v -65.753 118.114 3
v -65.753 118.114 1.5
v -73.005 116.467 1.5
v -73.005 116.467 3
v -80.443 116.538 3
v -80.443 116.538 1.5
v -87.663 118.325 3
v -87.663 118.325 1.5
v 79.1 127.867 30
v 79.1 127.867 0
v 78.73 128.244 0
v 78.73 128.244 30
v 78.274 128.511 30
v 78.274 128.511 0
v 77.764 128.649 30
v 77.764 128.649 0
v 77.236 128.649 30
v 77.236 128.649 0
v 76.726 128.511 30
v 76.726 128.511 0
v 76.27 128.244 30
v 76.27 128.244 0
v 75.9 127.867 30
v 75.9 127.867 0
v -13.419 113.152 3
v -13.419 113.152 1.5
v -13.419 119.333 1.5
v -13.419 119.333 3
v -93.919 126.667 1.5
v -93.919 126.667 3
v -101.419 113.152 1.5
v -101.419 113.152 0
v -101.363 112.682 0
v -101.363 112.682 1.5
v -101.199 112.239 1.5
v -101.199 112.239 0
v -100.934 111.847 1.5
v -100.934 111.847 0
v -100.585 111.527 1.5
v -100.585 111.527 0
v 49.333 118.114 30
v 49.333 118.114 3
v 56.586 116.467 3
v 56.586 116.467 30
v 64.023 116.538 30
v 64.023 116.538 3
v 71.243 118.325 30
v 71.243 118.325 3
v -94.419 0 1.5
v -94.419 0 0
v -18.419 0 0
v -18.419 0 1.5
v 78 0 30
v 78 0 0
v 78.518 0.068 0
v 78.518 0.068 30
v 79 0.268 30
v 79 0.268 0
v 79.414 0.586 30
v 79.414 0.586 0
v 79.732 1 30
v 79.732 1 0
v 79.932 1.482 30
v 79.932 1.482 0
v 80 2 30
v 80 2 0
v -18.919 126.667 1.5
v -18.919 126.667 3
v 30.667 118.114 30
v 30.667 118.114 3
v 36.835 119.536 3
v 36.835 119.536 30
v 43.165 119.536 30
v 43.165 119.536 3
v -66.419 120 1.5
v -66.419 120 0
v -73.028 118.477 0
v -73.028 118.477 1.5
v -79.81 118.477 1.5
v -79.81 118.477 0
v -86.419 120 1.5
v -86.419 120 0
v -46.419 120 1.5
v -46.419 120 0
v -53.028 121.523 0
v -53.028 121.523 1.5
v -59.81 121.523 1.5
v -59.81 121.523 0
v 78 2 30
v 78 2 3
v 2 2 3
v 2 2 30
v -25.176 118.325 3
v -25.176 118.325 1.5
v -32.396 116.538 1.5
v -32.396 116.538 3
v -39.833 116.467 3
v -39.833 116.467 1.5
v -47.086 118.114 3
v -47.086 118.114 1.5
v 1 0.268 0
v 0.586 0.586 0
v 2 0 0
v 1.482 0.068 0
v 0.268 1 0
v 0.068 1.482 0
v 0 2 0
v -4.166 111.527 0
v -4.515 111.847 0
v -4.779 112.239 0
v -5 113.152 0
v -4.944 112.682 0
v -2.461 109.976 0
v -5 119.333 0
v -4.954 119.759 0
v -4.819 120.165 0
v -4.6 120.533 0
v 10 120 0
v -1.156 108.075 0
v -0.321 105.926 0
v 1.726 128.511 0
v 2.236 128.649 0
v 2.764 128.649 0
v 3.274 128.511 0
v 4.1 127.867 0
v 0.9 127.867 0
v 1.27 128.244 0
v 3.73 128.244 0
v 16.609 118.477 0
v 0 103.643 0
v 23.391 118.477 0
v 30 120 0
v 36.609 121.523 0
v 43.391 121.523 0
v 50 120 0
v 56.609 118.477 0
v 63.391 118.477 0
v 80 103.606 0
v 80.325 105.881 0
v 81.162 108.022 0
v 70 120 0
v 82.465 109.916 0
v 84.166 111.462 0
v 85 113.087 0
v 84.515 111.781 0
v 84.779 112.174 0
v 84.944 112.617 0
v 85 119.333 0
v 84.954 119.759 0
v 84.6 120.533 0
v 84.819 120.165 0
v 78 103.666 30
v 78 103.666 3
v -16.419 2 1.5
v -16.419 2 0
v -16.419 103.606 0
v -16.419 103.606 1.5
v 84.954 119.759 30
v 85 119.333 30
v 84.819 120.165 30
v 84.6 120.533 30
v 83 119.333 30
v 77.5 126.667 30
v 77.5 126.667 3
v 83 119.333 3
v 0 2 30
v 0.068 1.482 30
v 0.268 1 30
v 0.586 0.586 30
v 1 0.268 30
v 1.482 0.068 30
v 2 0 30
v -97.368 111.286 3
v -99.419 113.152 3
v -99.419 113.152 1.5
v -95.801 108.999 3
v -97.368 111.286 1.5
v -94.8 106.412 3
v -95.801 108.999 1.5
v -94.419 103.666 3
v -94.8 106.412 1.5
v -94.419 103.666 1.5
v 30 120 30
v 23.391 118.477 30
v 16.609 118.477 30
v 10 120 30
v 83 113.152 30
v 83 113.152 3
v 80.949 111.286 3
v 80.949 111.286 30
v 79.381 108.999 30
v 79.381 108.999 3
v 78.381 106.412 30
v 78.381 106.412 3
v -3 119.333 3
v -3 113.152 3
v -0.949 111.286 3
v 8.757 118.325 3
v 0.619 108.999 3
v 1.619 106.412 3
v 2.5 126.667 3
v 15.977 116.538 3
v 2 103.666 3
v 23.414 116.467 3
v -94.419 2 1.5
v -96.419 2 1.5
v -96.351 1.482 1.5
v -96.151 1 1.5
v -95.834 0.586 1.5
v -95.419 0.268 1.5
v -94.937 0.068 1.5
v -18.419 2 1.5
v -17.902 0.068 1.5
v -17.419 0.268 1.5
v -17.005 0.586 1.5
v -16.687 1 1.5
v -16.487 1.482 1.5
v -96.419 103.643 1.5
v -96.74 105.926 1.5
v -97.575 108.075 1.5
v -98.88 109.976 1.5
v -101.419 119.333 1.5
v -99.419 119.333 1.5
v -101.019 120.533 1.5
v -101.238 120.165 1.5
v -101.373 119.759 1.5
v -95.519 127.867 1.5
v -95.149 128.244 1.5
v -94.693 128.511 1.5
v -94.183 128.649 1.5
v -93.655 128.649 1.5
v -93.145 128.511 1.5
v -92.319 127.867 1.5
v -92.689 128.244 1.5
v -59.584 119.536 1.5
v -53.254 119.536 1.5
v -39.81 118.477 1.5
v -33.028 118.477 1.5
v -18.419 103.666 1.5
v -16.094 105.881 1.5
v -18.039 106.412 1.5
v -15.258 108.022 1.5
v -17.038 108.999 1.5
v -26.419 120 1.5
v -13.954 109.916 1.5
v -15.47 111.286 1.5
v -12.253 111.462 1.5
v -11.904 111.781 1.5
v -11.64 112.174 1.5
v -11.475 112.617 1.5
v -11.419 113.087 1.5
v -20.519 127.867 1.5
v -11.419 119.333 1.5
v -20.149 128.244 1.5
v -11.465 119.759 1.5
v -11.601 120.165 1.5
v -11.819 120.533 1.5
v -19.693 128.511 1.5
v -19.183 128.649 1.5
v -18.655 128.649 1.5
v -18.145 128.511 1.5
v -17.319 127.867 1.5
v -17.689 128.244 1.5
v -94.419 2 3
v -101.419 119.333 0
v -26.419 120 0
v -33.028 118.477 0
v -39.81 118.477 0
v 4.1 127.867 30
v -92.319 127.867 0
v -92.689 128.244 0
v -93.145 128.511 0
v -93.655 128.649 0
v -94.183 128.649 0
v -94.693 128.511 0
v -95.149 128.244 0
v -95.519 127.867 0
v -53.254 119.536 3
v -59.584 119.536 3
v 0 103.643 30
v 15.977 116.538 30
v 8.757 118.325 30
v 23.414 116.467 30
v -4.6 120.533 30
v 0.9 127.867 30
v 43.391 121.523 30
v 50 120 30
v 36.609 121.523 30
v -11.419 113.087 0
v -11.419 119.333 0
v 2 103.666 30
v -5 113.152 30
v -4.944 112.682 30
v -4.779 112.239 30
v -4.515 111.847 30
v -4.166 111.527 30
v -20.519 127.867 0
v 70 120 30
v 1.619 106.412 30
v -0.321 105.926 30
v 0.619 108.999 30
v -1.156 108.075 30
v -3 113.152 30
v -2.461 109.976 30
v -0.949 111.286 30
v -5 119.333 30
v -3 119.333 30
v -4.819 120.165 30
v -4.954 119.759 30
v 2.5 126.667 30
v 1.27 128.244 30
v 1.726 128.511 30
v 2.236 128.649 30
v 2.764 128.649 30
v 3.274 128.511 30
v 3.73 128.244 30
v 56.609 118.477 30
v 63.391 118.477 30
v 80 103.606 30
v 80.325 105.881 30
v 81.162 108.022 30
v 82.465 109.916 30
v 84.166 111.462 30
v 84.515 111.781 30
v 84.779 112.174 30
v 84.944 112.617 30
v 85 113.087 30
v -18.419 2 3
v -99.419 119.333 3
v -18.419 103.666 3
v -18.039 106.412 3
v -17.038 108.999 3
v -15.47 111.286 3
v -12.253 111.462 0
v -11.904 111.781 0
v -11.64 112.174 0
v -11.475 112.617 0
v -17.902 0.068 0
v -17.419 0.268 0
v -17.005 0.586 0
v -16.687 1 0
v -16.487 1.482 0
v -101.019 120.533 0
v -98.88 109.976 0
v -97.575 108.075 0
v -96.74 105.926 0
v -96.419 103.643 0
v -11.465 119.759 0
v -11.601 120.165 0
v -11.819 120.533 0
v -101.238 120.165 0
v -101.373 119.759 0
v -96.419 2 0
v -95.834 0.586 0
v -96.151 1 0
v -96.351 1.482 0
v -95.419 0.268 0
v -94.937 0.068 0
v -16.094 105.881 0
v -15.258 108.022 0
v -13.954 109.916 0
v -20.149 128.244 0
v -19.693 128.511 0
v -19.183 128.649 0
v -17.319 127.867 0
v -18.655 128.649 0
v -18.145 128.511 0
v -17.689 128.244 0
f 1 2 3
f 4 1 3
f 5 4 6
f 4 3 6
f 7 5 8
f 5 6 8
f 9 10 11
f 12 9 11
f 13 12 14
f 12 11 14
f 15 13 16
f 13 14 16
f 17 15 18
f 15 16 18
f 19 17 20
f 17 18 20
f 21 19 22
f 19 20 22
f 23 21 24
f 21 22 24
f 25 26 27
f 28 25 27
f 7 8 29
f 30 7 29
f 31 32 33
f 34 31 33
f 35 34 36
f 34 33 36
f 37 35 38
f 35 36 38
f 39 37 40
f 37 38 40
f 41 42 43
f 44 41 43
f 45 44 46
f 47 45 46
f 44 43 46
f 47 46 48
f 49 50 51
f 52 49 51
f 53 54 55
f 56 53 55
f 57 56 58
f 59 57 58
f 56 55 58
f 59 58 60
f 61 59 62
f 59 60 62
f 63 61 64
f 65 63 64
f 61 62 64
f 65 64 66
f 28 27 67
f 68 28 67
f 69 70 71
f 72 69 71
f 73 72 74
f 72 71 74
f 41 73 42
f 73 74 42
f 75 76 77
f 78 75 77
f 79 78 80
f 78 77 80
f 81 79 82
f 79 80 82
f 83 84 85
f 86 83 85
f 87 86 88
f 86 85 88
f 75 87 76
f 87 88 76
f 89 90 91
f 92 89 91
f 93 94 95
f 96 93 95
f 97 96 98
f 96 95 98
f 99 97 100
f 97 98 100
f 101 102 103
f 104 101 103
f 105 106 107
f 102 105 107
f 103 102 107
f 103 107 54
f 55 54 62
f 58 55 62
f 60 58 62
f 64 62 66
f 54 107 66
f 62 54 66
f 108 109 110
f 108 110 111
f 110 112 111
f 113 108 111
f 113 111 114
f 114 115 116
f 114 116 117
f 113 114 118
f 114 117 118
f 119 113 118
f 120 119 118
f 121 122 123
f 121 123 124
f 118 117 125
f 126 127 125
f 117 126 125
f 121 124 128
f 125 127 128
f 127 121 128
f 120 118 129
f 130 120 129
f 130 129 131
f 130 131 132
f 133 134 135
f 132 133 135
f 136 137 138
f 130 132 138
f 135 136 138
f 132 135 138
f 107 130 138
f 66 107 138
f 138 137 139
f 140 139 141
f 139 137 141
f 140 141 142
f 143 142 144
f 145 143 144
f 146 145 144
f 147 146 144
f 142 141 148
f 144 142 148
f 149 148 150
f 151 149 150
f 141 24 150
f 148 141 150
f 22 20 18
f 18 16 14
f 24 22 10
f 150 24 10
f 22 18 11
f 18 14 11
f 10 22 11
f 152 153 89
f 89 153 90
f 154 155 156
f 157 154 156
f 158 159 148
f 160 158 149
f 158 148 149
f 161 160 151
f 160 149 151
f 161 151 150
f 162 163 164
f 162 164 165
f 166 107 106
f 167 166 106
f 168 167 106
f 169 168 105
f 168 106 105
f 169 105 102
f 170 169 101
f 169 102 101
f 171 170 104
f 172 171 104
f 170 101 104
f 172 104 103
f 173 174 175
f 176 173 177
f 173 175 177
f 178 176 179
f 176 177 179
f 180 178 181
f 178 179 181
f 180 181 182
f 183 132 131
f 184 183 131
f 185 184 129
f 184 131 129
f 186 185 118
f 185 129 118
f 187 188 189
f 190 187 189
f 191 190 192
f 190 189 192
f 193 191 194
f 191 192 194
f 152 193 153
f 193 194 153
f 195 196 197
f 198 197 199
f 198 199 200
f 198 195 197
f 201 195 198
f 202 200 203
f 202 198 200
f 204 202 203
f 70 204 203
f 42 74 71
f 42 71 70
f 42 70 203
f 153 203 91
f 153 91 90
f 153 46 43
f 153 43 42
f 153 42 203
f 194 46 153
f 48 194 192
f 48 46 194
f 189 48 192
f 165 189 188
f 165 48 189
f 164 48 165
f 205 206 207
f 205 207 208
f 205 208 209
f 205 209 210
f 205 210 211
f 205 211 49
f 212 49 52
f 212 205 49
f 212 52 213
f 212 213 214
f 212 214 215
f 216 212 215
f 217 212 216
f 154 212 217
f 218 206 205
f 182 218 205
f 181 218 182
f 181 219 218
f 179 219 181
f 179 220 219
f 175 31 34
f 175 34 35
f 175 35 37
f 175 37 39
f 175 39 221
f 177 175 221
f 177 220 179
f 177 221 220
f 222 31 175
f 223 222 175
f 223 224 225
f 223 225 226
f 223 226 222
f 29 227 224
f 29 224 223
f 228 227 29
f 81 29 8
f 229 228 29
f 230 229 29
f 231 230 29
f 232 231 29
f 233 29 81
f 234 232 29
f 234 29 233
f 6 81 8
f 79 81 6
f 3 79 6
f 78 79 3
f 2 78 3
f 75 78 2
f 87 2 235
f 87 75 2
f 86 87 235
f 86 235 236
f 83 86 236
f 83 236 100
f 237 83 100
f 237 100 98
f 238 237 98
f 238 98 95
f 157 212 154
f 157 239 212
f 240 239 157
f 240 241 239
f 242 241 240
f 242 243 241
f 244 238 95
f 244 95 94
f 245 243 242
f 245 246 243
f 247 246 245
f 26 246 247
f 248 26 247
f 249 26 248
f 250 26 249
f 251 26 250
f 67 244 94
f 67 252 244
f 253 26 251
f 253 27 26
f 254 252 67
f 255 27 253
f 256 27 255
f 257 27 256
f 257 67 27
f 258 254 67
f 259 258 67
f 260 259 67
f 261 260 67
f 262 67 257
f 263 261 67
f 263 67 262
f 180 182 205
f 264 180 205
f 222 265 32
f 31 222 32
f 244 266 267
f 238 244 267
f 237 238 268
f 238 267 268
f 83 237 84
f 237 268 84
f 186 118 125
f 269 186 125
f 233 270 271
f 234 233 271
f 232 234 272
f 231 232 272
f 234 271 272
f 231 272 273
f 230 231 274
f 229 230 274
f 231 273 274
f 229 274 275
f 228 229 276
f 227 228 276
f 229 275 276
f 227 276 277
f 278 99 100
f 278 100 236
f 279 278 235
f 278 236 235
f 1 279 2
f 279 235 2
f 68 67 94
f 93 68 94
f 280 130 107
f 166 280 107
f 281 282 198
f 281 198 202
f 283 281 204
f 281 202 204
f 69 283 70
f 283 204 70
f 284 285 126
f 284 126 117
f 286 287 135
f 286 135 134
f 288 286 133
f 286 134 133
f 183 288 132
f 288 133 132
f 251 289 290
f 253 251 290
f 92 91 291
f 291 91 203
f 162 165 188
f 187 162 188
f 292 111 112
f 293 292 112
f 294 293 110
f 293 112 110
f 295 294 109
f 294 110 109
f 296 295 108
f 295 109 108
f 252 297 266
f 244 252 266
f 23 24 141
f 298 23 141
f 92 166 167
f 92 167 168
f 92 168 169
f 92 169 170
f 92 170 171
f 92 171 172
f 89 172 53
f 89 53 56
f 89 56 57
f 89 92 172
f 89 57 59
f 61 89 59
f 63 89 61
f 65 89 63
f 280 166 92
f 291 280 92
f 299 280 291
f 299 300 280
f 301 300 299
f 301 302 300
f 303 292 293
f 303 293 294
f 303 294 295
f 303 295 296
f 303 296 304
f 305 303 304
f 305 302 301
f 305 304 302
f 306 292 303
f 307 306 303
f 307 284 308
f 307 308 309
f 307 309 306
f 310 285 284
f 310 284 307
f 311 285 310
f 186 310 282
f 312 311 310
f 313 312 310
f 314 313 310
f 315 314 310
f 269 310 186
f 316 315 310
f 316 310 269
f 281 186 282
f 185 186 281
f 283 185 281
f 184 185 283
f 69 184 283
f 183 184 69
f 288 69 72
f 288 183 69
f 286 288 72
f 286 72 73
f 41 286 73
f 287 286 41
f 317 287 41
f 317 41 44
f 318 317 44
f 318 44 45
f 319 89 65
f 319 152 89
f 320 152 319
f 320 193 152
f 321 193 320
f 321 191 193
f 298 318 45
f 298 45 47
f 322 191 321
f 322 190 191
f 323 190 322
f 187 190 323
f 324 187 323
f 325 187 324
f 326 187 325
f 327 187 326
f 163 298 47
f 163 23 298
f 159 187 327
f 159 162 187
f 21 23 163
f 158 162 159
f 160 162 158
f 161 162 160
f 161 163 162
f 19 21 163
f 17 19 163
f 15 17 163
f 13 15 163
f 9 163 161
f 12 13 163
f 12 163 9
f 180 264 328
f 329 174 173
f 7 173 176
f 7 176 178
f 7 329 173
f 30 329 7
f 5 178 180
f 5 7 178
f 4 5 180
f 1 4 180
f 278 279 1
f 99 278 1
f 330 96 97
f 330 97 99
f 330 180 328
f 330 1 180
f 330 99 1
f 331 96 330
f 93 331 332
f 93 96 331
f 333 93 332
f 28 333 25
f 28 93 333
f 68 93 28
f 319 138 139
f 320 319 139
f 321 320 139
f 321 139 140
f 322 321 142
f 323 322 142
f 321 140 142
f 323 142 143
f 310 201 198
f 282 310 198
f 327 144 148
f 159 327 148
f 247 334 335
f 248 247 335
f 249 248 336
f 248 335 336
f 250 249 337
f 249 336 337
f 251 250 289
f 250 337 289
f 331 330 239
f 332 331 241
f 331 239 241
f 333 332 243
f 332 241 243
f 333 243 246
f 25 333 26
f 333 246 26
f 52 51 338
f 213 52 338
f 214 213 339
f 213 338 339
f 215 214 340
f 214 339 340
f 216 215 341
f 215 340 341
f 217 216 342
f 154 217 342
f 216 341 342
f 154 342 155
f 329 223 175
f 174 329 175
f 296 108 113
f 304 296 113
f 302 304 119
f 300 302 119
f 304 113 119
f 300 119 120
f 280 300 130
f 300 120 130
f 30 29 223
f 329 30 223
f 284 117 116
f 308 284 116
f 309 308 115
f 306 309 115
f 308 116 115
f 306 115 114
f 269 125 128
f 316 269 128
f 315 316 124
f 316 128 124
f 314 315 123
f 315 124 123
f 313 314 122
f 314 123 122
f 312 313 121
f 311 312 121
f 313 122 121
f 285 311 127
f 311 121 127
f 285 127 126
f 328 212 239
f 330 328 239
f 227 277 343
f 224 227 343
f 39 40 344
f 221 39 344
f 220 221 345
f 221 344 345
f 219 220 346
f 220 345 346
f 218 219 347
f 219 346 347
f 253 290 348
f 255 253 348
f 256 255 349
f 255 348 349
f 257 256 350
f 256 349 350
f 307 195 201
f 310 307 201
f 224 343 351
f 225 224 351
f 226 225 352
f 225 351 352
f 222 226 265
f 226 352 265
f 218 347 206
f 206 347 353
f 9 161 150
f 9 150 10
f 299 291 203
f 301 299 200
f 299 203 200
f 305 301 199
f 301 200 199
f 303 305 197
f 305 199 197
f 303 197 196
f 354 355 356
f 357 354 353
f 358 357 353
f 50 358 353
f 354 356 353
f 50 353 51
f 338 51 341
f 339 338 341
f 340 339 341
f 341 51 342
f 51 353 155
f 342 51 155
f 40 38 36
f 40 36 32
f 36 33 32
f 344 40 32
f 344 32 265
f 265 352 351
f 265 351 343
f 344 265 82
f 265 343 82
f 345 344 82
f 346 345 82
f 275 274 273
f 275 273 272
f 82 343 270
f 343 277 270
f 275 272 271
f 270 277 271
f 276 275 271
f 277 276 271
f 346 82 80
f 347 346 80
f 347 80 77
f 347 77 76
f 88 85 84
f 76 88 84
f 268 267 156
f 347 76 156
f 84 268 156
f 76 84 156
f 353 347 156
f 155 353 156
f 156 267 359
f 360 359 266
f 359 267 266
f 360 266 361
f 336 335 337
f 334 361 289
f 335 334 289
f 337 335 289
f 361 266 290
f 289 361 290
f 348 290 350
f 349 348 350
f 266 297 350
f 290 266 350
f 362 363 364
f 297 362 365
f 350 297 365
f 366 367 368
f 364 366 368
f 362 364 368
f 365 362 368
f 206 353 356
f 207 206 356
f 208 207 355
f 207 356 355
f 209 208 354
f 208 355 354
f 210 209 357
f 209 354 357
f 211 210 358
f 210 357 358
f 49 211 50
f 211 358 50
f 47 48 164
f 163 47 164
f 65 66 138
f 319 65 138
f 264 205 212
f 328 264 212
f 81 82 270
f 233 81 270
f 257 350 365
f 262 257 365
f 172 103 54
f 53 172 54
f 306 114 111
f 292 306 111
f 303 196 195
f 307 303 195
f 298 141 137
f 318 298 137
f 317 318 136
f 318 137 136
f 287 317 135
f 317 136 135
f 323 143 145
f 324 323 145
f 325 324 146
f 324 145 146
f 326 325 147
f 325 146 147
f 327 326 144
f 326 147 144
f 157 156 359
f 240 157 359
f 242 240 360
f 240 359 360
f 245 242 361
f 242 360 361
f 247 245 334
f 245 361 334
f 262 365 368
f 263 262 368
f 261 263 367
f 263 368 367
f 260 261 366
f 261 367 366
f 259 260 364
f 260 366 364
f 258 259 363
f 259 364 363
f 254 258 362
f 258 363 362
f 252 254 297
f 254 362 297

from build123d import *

# Parameters (mm, degrees)
F1_DEPTH = 30
F2_DEPTH = 3
F4_DEPTH = 3
F5_DEPTH = 1.5


with BuildPart() as f1:
    # F0 (on Top) → F1 (new body)
    with BuildSketch(Plane.XY):
        with BuildLine():
            ThreePointArc((0, 2), (0.585786, 0.585786), (2, 0))
            Line((2, 0), (78, 0))
            ThreePointArc((78, 0), (79.414214, 0.585786), (80, 2))
            Line((80, 2), (80, 103.605524))
            ThreePointArc((80, 103.605524), (81.16164, 108.022417), (84.166069, 111.462151))
            ThreePointArc((84.166069, 111.462151), (84.779345, 112.173847), (85, 113.087046))
            Line((85, 113.087046), (85, 119.333333))
            ThreePointArc((85, 119.333333), (84.897367, 119.965789), (84.6, 120.533333))
            Line((84.6, 120.533333), (79.1, 127.866667))
            ThreePointArc((79.1, 127.866667), (77.5, 128.666667), (75.9, 127.866667))
            Line((75.9, 127.866667), (70, 120))
            ThreePointArc((70, 120), (60, 118.284271), (50, 120))
            ThreePointArc((50, 120), (40, 121.715729), (30, 120))
            ThreePointArc((30, 120), (20, 118.284271), (10, 120))
            Line((10, 120), (4.1, 127.866667))
            ThreePointArc((4.1, 127.866667), (2.5, 128.666667), (0.9, 127.866667))
            Line((0.9, 127.866667), (-4.6, 120.533333))
            ThreePointArc((-4.6, 120.533333), (-4.897367, 119.965789), (-5, 119.333333))
            Line((-5, 119.333333), (-5, 113.152142))
            ThreePointArc((-5, 113.152142), (-4.779379, 112.239009), (-4.166188, 111.527333))
            ThreePointArc((-4.166188, 111.527333), (-1.15557, 108.075205), (0, 103.642862))
            Line((0, 103.642862), (0, 2))
        make_face()
        with BuildLine():
            Line((2.5, 126.666667), (8.756601, 118.324532))
            ThreePointArc((8.756601, 118.324532), (19.693087, 116.285743), (30.666667, 118.114382))
            ThreePointArc((30.666667, 118.114382), (40, 119.715729), (49.333333, 118.114382))
            ThreePointArc((49.333333, 118.114382), (60.306913, 116.285743), (71.243399, 118.324532))
            Line((71.243399, 118.324532), (77.5, 126.666667))
            Line((77.5, 126.666667), (83, 119.333333))
            Line((83, 119.333333), (83, 113.152142))
            ThreePointArc((83, 113.152142), (79.381412, 108.99851), (78, 103.665731))
            Line((78, 103.665731), (78, 103.605524))
            Line((78, 103.605524), (78, 2))
            Line((78, 2), (2, 2))
            Line((2, 2), (2, 103.665731))
            ThreePointArc((2, 103.665731), (0.618588, 108.99851), (-3, 113.152142))
            Line((-3, 113.152142), (-3, 119.333333))
            Line((-3, 119.333333), (2.5, 126.666667))
        make_face(mode=Mode.SUBTRACT)
    extrude(amount=F1_DEPTH)

    # F0 (on Top) → F2 (join)
    with BuildSketch(Plane.XY):
        with BuildLine():
            ThreePointArc((30.666667, 118.114382), (19.693087, 116.285743), (8.756601, 118.324532))
            Line((8.756601, 118.324532), (2.5, 126.666667))
            Line((2.5, 126.666667), (-3, 119.333333))
            Line((-3, 119.333333), (-3, 113.152142))
            ThreePointArc((-3, 113.152142), (0.618588, 108.99851), (2, 103.665731))
            Line((2, 103.665731), (2, 2))
            Line((2, 2), (78, 2))
            Line((78, 2), (78, 103.605524))
            Line((78, 103.605524), (78, 103.665731))
            ThreePointArc((78, 103.665731), (79.381412, 108.99851), (83, 113.152142))
            Line((83, 113.152142), (83, 119.333333))
            Line((83, 119.333333), (77.5, 126.666667))
            Line((77.5, 126.666667), (71.243399, 118.324532))
            ThreePointArc((71.243399, 118.324532), (60.306913, 116.285743), (49.333333, 118.114382))
            ThreePointArc((49.333333, 118.114382), (40, 119.715729), (30.666667, 118.114382))
        make_face()
    extrude(amount=F2_DEPTH)


with BuildPart() as f4:
    # F3 (on Top) → F4 (new body)
    with BuildSketch(Plane.XY):
        with BuildLine():
            ThreePointArc((-65.752624, 118.114382), (-76.726204, 116.285743), (-87.66269, 118.324532))
            Line((-87.66269, 118.324532), (-93.919291, 126.666667))
            Line((-93.919291, 126.666667), (-99.419291, 119.333333))
            Line((-99.419291, 119.333333), (-99.419291, 113.152142))
            ThreePointArc((-99.419291, 113.152142), (-95.800702, 108.99851), (-94.419291, 103.665731))
            Line((-94.419291, 103.665731), (-94.419291, 2))
            Line((-94.419291, 2), (-18.419291, 2))
            Line((-18.419291, 2), (-18.419291, 103.605524))
            Line((-18.419291, 103.605524), (-18.419291, 103.665731))
            ThreePointArc((-18.419291, 103.665731), (-17.037879, 108.99851), (-13.419291, 113.152142))
            Line((-13.419291, 113.152142), (-13.419291, 119.333333))
            Line((-13.419291, 119.333333), (-18.919291, 126.666667))
            Line((-18.919291, 126.666667), (-25.175892, 118.324532))
            ThreePointArc((-25.175892, 118.324532), (-36.112377, 116.285743), (-47.085957, 118.114382))
            ThreePointArc((-47.085957, 118.114382), (-56.419291, 119.715729), (-65.752624, 118.114382))
        make_face()
    extrude(amount=F4_DEPTH)

    # F3 (on Top) → F5 (join)
    with BuildSketch(Plane.XY):
        with BuildLine():
            ThreePointArc((-96.419291, 2), (-95.833504, 0.585786), (-94.419291, 0))
            Line((-94.419291, 0), (-18.419291, 0))
            ThreePointArc((-18.419291, 0), (-17.005077, 0.585786), (-16.419291, 2))
            Line((-16.419291, 2), (-16.419291, 103.605524))
            ThreePointArc((-16.419291, 103.605524), (-15.25765, 108.022417), (-12.253222, 111.462151))
            ThreePointArc((-12.253222, 111.462151), (-11.639946, 112.173847), (-11.419291, 113.087046))
            Line((-11.419291, 113.087046), (-11.419291, 119.333333))
            ThreePointArc((-11.419291, 119.333333), (-11.521924, 119.965789), (-11.819291, 120.533333))
            Line((-11.819291, 120.533333), (-17.319291, 127.866667))
            ThreePointArc((-17.319291, 127.866667), (-18.919291, 128.666667), (-20.519291, 127.866667))
            Line((-20.519291, 127.866667), (-26.419291, 120))
            ThreePointArc((-26.419291, 120), (-36.419291, 118.284271), (-46.419291, 120))
            ThreePointArc((-46.419291, 120), (-56.419291, 121.715729), (-66.419291, 120))
            ThreePointArc((-66.419291, 120), (-76.419291, 118.284271), (-86.419291, 120))
            Line((-86.419291, 120), (-92.319291, 127.866667))
            ThreePointArc((-92.319291, 127.866667), (-93.919291, 128.666667), (-95.519291, 127.866667))
            Line((-95.519291, 127.866667), (-101.019291, 120.533333))
            ThreePointArc((-101.019291, 120.533333), (-101.316657, 119.965789), (-101.419291, 119.333333))
            Line((-101.419291, 119.333333), (-101.419291, 113.152142))
            ThreePointArc((-101.419291, 113.152142), (-101.198669, 112.239009), (-100.585479, 111.527333))
            ThreePointArc((-100.585479, 111.527333), (-97.574861, 108.075205), (-96.419291, 103.642862))
            Line((-96.419291, 103.642862), (-96.419291, 2))
        make_face()
        with BuildLine():
            Line((-93.919291, 126.666667), (-87.66269, 118.324532))
            ThreePointArc((-87.66269, 118.324532), (-76.726204, 116.285743), (-65.752624, 118.114382))
            ThreePointArc((-65.752624, 118.114382), (-56.419291, 119.715729), (-47.085957, 118.114382))
            ThreePointArc((-47.085957, 118.114382), (-36.112377, 116.285743), (-25.175892, 118.324532))
            Line((-25.175892, 118.324532), (-18.919291, 126.666667))
            Line((-18.919291, 126.666667), (-13.419291, 119.333333))
            Line((-13.419291, 119.333333), (-13.419291, 113.152142))
            ThreePointArc((-13.419291, 113.152142), (-17.037879, 108.99851), (-18.419291, 103.665731))
            Line((-18.419291, 103.665731), (-18.419291, 103.605524))
            Line((-18.419291, 103.605524), (-18.419291, 2))
            Line((-18.419291, 2), (-94.419291, 2))
            Line((-94.419291, 2), (-94.419291, 103.665731))
            ThreePointArc((-94.419291, 103.665731), (-95.800702, 108.99851), (-99.419291, 113.152142))
            Line((-99.419291, 113.152142), (-99.419291, 119.333333))
            Line((-99.419291, 119.333333), (-93.919291, 126.666667))
        make_face(mode=Mode.SUBTRACT)
    extrude(amount=F5_DEPTH)


solid = Compound([f1.part, f4.part])
